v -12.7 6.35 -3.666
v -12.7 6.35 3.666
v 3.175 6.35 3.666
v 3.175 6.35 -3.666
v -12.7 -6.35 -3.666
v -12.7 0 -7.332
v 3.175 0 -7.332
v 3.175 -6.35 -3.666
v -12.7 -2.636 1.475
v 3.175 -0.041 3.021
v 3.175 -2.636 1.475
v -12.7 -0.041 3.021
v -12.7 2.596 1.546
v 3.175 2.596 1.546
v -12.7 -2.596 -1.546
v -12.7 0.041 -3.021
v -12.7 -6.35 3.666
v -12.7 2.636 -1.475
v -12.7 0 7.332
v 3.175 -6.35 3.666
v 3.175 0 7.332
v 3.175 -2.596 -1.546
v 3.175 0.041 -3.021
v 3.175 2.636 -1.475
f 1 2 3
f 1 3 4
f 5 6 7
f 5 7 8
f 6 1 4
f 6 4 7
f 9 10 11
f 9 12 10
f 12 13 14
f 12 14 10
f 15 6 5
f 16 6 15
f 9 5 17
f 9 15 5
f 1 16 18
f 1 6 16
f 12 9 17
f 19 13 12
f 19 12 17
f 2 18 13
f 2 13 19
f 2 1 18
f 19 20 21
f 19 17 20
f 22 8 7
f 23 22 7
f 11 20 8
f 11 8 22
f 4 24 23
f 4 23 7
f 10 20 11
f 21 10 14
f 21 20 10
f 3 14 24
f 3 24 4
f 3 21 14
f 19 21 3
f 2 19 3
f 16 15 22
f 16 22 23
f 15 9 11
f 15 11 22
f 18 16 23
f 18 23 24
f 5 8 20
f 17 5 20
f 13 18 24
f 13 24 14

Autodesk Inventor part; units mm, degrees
ref_plane "YZ Plane" through (0, 0, 0) normal (1, 0, 0) x (0, 1, 0)
ref_plane "XZ Plane" through (0, 0, 0) normal (0, 1, 0) x (-1, 0, 0)
ref_plane "XY Plane" through (0, 0, 0) normal (0, 0, 1) x (1, 0, 0)
sketch "Sketch1" plane through (0, 0, 0) normal (1, 0, 0) x (0, 1, 0)
  line L0 (6.35, -3.6662) -> (0, -7.3323)
  line L1 (0, -7.3323) -> (-6.35, -3.6662)
  line L2 (-6.35, -3.6662) -> (-6.35, 3.6662)
  line L3 (-6.35, 3.6662) -> (0, 7.3323)
  line L4 (0, 7.3323) -> (6.35, 3.6662)
  line L5 (6.35, 3.6662) -> (6.35, -3.6662)
  point P0 (0, 0)
  point P1 (0, 0)
  dimension "d0" = 6.35
extrude "Extrusion1" add sketch "Sketch1" along normal blind 3.175
sketch "Sketch3" plane through (0, 0, 0) normal (-1, 0, 0) x (0, 0, 1)
  line L0 (-3.0207, 0.0407) -> (-1.475, 2.6363)
  line L1 (-1.475, 2.6363) -> (1.5456, 2.5956)
  line L2 (1.5456, 2.5956) -> (3.0207, -0.0407)
  line L3 (3.0207, -0.0407) -> (1.475, -2.6363)
  line L4 (1.475, -2.6363) -> (-1.5456, -2.5956)
  line L5 (-1.5456, -2.5956) -> (-3.0207, 0.0407)
  line L6 (-3.6662, 6.35) -> (-7.3323, 0) projected
  line L7 (-7.3323, 0) -> (-3.6662, -6.35) projected
  line L8 (-3.6662, -6.35) -> (3.6662, -6.35) projected
  line L9 (3.6662, -6.35) -> (7.3323, 0) projected
  line L10 (7.3323, 0) -> (3.6662, 6.35) projected
  line L11 (3.6662, 6.35) -> (-3.6662, 6.35) projected
  point P0 (0, 0)
  point P1 (0, 0)
  point P2 (0, 0)
  dimension "d6" = 2.6162
extrude "Extrusion3" add sketch "Sketch3" along normal blind 12.7
extrude "Extrusion4" cut sketch "Sketch3" against normal through all contours L0 L1 L2 L3 L4 L5
properties part number "5mm-.5in hex converter"
